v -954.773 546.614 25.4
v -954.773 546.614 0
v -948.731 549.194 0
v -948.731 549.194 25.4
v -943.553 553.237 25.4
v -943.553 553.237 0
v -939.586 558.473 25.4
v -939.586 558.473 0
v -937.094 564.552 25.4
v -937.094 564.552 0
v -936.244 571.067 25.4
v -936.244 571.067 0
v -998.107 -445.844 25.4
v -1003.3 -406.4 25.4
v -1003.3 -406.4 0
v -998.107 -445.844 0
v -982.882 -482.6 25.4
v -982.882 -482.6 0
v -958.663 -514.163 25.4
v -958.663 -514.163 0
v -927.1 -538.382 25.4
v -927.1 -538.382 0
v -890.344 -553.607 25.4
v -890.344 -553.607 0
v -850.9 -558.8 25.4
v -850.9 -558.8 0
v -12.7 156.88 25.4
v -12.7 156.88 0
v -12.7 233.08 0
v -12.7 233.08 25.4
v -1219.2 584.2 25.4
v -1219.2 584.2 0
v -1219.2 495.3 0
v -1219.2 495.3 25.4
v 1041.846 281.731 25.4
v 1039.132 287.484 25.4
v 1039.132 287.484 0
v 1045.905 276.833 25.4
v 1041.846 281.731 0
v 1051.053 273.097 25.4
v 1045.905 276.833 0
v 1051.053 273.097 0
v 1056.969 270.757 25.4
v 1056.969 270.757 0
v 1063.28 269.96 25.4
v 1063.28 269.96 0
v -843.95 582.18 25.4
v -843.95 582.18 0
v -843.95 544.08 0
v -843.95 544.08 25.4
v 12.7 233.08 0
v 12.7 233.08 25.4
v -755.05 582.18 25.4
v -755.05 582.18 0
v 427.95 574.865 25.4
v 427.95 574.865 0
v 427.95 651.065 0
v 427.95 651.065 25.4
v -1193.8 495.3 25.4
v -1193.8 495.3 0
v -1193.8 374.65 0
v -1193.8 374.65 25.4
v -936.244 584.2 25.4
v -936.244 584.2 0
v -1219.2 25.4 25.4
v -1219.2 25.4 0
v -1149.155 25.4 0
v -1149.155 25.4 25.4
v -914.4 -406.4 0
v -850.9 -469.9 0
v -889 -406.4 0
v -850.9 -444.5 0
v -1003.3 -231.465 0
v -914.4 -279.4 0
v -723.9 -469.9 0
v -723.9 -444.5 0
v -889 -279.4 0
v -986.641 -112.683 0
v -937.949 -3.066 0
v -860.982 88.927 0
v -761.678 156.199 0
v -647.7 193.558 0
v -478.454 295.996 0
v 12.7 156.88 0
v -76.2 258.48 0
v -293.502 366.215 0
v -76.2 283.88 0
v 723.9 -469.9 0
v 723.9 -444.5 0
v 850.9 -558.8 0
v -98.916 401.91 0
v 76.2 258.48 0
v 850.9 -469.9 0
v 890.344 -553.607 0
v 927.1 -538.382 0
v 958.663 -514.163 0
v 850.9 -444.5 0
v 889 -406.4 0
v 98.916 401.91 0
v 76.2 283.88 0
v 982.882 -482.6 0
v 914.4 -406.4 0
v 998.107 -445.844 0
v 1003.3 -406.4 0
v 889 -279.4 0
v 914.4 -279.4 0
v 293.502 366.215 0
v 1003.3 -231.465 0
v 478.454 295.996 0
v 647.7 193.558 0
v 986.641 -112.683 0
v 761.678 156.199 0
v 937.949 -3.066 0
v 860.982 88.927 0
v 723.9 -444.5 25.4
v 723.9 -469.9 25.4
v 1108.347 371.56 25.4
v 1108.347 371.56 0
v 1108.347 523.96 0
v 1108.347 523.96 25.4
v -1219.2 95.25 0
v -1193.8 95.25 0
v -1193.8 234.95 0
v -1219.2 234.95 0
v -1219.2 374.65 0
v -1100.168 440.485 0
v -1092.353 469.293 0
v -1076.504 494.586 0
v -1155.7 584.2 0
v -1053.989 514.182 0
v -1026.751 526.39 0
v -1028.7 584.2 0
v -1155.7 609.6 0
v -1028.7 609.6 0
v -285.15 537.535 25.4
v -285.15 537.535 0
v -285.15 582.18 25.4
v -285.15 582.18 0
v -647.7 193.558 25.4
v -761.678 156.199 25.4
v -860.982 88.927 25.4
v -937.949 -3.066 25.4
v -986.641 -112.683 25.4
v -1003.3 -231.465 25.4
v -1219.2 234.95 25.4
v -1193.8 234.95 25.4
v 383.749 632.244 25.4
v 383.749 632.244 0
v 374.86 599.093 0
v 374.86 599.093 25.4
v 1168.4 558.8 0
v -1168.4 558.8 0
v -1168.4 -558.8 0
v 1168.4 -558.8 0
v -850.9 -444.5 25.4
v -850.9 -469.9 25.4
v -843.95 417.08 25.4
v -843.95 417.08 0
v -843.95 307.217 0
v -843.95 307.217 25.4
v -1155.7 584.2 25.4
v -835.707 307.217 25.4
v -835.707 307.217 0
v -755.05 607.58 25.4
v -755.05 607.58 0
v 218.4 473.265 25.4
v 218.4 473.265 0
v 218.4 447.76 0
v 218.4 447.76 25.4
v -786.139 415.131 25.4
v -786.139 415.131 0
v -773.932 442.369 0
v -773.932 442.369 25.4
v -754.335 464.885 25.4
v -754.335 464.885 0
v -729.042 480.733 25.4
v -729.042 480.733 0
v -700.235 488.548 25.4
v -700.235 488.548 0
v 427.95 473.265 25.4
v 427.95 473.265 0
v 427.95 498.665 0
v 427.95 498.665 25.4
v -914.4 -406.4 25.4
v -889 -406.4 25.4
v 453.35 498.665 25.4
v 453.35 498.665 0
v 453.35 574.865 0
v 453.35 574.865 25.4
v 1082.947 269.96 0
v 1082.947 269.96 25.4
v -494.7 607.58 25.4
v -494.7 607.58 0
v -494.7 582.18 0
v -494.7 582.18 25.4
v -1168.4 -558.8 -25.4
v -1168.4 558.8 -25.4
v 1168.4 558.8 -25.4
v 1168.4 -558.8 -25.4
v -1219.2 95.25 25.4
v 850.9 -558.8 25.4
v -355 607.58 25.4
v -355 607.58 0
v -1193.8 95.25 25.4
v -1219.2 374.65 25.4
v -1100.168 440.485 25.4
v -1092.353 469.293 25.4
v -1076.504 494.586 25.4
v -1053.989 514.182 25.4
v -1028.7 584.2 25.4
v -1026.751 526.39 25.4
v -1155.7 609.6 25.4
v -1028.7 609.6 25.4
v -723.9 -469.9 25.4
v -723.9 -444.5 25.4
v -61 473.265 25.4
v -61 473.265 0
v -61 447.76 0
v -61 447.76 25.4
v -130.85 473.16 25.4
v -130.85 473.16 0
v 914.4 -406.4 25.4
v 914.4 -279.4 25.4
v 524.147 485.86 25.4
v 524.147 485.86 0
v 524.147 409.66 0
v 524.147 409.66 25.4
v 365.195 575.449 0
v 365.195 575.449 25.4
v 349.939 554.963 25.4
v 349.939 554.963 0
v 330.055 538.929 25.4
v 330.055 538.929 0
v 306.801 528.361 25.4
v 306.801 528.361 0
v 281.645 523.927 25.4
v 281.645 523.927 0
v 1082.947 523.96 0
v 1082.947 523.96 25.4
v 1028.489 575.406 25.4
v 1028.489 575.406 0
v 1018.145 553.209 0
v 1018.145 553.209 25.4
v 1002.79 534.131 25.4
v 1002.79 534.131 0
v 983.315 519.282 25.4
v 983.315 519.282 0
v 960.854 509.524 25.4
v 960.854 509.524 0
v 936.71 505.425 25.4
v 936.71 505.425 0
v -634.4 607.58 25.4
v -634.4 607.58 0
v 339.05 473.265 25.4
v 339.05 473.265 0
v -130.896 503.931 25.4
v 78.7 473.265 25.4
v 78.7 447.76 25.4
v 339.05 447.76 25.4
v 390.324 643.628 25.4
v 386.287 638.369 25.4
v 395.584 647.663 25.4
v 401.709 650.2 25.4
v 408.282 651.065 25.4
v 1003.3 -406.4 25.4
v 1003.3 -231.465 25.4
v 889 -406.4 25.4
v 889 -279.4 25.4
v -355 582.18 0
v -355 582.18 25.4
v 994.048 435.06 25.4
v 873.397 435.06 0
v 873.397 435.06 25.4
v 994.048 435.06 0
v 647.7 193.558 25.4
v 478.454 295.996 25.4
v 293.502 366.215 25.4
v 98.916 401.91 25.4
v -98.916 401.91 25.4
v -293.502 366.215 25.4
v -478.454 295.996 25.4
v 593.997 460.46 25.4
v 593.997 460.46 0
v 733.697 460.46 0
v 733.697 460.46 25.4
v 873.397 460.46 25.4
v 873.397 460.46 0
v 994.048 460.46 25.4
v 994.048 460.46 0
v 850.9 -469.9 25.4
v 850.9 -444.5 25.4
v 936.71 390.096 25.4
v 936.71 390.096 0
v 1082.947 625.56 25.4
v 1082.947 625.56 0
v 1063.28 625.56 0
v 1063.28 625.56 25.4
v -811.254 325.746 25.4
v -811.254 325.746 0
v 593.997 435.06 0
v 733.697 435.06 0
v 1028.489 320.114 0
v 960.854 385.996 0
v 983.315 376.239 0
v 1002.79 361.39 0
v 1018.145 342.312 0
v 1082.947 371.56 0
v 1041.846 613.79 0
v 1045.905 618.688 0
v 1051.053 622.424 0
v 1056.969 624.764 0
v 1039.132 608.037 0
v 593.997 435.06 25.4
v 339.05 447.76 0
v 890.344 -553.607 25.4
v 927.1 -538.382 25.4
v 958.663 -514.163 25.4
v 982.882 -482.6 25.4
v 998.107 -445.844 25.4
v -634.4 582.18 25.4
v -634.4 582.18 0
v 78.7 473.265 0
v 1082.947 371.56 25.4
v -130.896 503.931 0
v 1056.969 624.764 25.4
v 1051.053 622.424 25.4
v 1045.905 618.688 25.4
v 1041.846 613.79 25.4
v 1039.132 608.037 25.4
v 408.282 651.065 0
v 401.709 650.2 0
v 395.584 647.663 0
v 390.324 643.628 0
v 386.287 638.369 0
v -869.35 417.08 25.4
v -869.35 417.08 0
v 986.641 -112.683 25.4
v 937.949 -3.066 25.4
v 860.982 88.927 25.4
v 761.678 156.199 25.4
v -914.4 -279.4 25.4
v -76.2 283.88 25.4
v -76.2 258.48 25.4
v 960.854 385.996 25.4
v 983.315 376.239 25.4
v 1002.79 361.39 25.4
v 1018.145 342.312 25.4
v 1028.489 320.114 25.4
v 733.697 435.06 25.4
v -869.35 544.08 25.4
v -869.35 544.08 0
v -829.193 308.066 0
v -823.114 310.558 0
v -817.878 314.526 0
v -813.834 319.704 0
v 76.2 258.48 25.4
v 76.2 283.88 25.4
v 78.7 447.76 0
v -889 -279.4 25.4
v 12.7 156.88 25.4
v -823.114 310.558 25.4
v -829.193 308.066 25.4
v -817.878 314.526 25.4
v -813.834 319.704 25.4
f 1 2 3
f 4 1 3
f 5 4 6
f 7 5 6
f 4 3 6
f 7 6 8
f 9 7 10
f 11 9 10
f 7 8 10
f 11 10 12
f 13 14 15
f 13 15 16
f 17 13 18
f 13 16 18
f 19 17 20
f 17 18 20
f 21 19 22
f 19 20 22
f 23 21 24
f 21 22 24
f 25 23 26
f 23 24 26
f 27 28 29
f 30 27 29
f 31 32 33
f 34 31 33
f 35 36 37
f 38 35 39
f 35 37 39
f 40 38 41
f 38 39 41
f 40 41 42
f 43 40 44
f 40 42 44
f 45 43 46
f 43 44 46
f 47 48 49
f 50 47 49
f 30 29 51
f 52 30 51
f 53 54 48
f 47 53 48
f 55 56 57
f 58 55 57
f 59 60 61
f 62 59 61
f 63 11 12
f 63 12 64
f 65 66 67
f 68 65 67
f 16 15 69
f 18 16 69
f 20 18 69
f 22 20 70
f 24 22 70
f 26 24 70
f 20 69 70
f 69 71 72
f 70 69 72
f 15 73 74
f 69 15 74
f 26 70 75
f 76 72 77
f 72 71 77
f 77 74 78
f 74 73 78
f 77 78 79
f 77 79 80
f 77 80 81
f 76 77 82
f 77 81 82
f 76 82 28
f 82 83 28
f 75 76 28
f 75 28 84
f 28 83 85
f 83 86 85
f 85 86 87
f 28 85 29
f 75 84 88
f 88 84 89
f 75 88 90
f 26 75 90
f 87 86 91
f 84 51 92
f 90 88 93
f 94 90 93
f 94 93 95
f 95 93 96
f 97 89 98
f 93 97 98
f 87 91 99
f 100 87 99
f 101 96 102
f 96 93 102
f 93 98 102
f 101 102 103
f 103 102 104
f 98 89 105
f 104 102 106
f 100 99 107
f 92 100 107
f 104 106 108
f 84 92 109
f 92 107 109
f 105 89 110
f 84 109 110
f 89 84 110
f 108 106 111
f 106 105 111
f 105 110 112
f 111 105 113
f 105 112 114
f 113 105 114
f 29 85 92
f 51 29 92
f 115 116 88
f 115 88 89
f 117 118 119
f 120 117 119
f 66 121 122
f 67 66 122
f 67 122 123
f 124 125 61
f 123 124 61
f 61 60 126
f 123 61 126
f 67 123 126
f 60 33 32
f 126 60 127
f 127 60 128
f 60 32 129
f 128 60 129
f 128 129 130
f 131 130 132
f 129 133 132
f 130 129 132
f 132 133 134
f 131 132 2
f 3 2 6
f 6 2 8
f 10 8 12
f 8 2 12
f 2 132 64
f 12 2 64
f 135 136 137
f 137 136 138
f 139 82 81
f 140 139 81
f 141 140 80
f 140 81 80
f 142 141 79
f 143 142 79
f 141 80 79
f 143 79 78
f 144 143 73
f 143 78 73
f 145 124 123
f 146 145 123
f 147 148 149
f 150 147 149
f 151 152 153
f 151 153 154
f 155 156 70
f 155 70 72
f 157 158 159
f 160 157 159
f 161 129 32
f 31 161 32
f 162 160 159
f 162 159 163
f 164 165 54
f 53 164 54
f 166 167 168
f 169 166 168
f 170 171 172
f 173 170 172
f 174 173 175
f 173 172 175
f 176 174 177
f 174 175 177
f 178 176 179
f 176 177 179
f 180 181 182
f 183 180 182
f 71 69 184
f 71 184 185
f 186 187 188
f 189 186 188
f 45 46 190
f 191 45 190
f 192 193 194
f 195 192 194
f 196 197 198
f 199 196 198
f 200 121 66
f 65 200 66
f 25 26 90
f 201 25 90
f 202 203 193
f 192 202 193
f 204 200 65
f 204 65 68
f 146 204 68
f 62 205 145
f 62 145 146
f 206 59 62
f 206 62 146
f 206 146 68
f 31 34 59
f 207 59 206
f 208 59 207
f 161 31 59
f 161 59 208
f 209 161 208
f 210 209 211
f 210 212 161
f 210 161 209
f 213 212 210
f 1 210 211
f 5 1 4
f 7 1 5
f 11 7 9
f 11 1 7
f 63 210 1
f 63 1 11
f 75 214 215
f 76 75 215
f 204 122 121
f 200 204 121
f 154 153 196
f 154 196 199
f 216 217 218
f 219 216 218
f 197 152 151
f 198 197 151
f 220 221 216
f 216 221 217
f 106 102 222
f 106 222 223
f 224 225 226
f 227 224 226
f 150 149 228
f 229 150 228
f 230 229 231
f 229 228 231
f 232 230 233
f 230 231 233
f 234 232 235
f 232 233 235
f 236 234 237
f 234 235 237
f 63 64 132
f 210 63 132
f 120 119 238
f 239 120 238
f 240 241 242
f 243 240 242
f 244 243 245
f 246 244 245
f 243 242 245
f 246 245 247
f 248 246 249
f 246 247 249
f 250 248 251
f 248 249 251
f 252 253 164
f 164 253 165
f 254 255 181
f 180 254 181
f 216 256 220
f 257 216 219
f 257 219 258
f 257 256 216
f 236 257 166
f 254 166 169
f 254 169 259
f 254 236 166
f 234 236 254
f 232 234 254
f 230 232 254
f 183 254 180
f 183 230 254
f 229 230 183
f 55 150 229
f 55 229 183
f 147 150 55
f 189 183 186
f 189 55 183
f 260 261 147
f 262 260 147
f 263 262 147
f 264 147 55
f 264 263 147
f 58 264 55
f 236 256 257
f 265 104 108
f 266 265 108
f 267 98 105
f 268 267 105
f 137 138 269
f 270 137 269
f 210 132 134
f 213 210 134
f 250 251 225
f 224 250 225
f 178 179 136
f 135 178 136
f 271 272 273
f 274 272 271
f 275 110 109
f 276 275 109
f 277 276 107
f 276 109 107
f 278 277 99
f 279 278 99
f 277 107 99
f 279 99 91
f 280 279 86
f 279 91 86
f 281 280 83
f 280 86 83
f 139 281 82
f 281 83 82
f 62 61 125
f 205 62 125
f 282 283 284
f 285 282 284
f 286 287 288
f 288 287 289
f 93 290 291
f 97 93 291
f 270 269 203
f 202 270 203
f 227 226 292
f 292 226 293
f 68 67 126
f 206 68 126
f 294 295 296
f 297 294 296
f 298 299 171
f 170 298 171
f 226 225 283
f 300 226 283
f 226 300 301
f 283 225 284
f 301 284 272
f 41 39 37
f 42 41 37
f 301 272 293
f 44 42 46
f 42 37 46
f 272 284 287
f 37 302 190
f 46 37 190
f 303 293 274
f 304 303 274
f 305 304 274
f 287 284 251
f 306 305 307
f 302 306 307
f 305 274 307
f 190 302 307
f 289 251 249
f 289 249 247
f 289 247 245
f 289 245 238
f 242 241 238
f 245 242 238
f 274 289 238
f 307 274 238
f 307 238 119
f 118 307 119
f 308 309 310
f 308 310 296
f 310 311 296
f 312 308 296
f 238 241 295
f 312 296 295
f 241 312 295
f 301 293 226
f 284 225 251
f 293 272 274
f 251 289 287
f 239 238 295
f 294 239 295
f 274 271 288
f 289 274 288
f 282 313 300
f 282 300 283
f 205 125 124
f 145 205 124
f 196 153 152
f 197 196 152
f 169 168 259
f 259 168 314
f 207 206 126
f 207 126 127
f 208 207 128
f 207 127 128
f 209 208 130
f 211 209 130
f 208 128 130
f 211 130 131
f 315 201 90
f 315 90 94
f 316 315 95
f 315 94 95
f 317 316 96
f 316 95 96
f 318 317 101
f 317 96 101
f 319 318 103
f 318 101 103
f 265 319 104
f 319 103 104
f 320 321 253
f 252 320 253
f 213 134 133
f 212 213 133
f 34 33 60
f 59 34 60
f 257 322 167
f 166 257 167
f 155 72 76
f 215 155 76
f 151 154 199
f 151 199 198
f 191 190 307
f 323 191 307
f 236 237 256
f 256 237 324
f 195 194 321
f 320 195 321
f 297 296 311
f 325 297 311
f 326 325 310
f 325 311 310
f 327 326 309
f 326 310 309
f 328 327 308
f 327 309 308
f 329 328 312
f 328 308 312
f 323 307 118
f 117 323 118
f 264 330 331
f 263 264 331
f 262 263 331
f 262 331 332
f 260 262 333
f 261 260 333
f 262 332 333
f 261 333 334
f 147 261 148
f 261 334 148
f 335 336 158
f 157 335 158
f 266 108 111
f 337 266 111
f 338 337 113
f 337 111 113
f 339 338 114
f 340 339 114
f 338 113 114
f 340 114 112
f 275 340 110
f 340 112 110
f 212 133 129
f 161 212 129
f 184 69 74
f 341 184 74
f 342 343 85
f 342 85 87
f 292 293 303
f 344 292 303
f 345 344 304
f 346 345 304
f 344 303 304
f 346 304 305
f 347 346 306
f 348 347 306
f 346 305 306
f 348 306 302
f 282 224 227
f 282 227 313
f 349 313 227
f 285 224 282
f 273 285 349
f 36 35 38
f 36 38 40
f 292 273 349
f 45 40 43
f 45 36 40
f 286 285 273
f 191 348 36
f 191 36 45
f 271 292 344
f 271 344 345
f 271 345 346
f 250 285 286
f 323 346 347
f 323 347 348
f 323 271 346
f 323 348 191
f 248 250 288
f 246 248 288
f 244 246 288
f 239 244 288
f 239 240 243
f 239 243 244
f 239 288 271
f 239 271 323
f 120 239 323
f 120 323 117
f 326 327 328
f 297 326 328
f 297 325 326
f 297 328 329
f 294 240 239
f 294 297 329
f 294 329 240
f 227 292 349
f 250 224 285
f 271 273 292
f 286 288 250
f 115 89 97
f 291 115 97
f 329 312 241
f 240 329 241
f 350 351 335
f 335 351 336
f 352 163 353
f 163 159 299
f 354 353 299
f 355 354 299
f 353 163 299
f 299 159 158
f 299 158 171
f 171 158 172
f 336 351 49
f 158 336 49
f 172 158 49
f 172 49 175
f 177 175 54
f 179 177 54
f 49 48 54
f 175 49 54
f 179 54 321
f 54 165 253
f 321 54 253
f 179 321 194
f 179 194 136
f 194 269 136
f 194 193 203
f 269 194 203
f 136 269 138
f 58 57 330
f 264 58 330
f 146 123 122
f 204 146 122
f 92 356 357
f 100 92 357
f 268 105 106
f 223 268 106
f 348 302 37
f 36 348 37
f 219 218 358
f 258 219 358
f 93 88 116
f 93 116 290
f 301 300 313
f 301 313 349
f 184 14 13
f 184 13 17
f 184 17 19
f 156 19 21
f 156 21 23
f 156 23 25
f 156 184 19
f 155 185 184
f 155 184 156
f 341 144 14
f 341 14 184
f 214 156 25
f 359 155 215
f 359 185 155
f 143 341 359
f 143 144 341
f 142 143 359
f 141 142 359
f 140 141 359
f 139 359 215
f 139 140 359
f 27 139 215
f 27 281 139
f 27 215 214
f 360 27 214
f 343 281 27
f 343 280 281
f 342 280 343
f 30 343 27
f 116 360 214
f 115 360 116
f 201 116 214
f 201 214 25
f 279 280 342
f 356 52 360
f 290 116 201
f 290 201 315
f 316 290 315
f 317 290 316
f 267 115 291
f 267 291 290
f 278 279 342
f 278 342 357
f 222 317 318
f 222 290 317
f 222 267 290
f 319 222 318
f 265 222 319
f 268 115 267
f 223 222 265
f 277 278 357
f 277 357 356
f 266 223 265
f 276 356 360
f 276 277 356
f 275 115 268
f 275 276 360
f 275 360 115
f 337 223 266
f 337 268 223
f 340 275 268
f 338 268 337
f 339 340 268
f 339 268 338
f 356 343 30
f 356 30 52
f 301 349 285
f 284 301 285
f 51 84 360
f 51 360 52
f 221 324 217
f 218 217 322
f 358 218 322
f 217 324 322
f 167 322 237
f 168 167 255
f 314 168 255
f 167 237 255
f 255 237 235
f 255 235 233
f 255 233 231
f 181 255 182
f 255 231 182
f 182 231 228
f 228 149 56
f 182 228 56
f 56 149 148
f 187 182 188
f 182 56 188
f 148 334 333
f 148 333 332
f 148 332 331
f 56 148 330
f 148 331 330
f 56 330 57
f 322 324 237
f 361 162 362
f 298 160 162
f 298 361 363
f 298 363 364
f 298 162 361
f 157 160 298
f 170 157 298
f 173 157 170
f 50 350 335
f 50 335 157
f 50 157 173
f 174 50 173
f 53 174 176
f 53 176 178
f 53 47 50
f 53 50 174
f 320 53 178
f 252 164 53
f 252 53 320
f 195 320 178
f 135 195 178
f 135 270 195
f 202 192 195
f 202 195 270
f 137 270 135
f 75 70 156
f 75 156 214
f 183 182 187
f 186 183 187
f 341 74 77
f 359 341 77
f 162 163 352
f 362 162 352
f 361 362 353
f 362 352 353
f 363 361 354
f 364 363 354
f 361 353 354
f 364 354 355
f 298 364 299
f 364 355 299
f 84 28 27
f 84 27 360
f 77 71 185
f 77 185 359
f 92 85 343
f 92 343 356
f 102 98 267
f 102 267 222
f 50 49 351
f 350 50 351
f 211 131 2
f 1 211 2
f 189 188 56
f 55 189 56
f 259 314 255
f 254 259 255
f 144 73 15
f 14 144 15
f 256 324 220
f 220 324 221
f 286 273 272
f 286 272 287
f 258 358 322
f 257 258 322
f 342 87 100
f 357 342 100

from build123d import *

# Parameters (mm, degrees)
F1_W     = 127
F1_H     = 25.4
F1_W_2   = 25.4
F1_H_2   = 127
F1_H_3   = 76.2
F1_W_3   = 152.4
F2_DEPTH = 25.4
F1_W_4   = 139.7
F1_W_5   = 120.6500786332
F3_W     = 2336.8
F3_H     = 1117.6
F4_DEPTH = 25.4


# Not quite as in the source:
# - a variable given as a bare number and used for a length is read in inches; the dataset says mm whatever the document's units were


with BuildPart() as f2:
    # F1 (on Top) → F2 (new body)
    with BuildSketch(Plane.XY):
        with BuildLine():
            ThreePointArc((647.7, 193.5579180717), (0, 406.4), (-647.7, 193.5579180717))
            ThreePointArc((-647.7, 193.5579180717), (-902.6754821843, 45.6159123042), (-1003.3, -231.4653754076))
            Line((-1003.3, -231.4653754076), (-1003.3, -406.4))
            ThreePointArc((-1003.3, -406.4), (-958.6630734528, -514.1630734528), (-850.9, -558.8))
            Line((-850.9, -558.8), (850.9, -558.8))
            ThreePointArc((850.9, -558.8), (958.6630734528, -514.1630734528), (1003.3, -406.4))
            Line((1003.3, -406.4), (1003.3, -231.4653754076))
            ThreePointArc((1003.3, -231.4653754076), (902.6754821843, 45.6159123042), (647.7, 193.5579180717))
        make_face()
        with Locations((-787.4, -457.2)):
            Rectangle(F1_W, F1_H, mode=Mode.SUBTRACT)
        with Locations((-901.7, -342.9)):
            Rectangle(F1_W_2, F1_H_2, mode=Mode.SUBTRACT)
        with Locations((787.4, -457.2)):
            Rectangle(F1_W, F1_H, mode=Mode.SUBTRACT)
        with Locations((901.7, -342.9)):
            Rectangle(F1_W_2, F1_H_2, mode=Mode.SUBTRACT)
        with Locations((0, 194.9797632933)):
            Rectangle(F1_W_2, F1_H_3, mode=Mode.SUBTRACT)
        with Locations((0, 271.1797632933)):
            Rectangle(F1_W_3, F1_H, mode=Mode.SUBTRACT)
    extrude(amount=F2_DEPTH)


with BuildPart() as f2b:
    # F1 (on Top) → F2, piece 2 (new body)
    with BuildSketch(Plane.XY):
        with BuildLine():
            Line((-1155.7, 584.2), (-1219.2, 584.2))
            Line((-1219.2, 584.2), (-1219.2, 495.3))
            Line((-1219.2, 495.3), (-1193.8, 495.3))
            Line((-1193.8, 495.3), (-1193.8, 374.65))
            Line((-1193.8, 374.65), (-1219.2, 374.65))
            Line((-1219.2, 374.65), (-1219.2, 234.95))
            Line((-1219.2, 234.95), (-1193.8, 234.95))
            Line((-1193.8, 234.95), (-1193.8, 95.25))
            Line((-1193.8, 95.25), (-1219.2, 95.25))
            Line((-1219.2, 95.25), (-1219.2, 25.4))
            Line((-1219.2, 25.4), (-1149.1548928144, 25.4))
            Line((-1149.1548928144, 25.4), (-1100.1678840305, 440.4851537224))
            ThreePointArc((-1100.1678840305, 440.4851537224), (-1076.504269872, 494.5859013387), (-1026.751056115, 526.3896))
            Line((-1026.751056115, 526.3896), (-954.7732654951, 546.6136509902))
            ThreePointArc((-954.7732654951, 546.6136509902), (-941.3995358626, 555.7265307509), (-936.244, 571.0667286567))
            Line((-936.244, 571.0667286567), (-936.244, 584.2))
            Line((-936.244, 584.2), (-1028.7, 584.2))
            Line((-1028.7, 584.2), (-1028.7, 609.6))
            Line((-1028.7, 609.6), (-1155.7, 609.6))
            Line((-1155.7, 609.6), (-1155.7, 584.2))
        make_face()
    extrude(amount=F2_DEPTH)


with BuildPart() as f2c:
    # F1 (on Top) → F2, piece 3 (new body)
    with BuildSketch(Plane.XY):
        with BuildLine():
            Line((-843.9495392799, 307.2166677045), (-835.7073963069, 307.2166677045))
            ThreePointArc((-835.7073963069, 307.2166677045), (-820.3671984011, 312.3722035671), (-811.2543186404, 325.7459331997))
            Line((-811.2543186404, 325.7459331997), (-786.1391392799, 415.1313447704))
            ThreePointArc((-786.1391392799, 415.1313447704), (-754.3354406186, 464.8845585274), (-700.2346930023, 488.5481726859))
            Line((-700.2346930023, 488.5481726859), (-285.1495392799, 537.5351814698))
            Line((-285.1495392799, 537.5351814698), (-285.1495392799, 582.1802886554))
            Line((-285.1495392799, 582.1802886554), (-354.9995392799, 582.1802886554))
            Line((-354.9995392799, 582.1802886554), (-354.9995392799, 607.5802886554))
            Line((-354.9995392799, 607.5802886554), (-494.6995392799, 607.5802886554))
            Line((-494.6995392799, 607.5802886554), (-494.6995392799, 582.1802886554))
            Line((-494.6995392799, 582.1802886554), (-634.3995392799, 582.1802886554))
            Line((-634.3995392799, 582.1802886554), (-634.3995392799, 607.5802886554))
            Line((-634.3995392799, 607.5802886554), (-755.0495392799, 607.5802886554))
            Line((-755.0495392799, 607.5802886554), (-755.0495392799, 582.1802886554))
            Line((-755.0495392799, 582.1802886554), (-843.9495392799, 582.1802886554))
            Line((-843.9495392799, 582.1802886554), (-843.9495392799, 544.0802886554))
            Line((-843.9495392799, 544.0802886554), (-869.3495392799, 544.0802886554))
            Line((-869.3495392799, 544.0802886554), (-869.3495392799, 417.0802886554))
            Line((-869.3495392799, 417.0802886554), (-843.9495392799, 417.0802886554))
            Line((-843.9495392799, 417.0802886554), (-843.9495392799, 307.2166677045))
        make_face()
    extrude(amount=F2_DEPTH)


with BuildPart() as f2d:
    # F1 (on Top) → F2, piece 4 (new body)
    with BuildSketch(Plane.XY):
        with BuildLine():
            Line((524.1474925995, 485.8604307627), (524.1474925995, 447.7604307627))
            Line((524.1474925995, 447.7604307627), (524.1474925995, 409.6604307627))
            Line((524.1474925995, 409.6604307627), (936.7098303317, 390.0960868362))
            ThreePointArc((936.7098303317, 390.0960868362), (993.5014833177, 369.4029146453), (1028.4893234405, 320.1144751514))
            Line((1028.4893234405, 320.1144751514), (1039.1319184416, 287.4843454036))
            ThreePointArc((1039.1319184416, 287.4843454036), (1048.3617125766, 274.8030407518), (1063.2799469204, 269.9604307627))
            Line((1063.2799469204, 269.9604307627), (1082.9474925995, 269.9604307627))
            Line((1082.9474925995, 269.9604307627), (1082.9474925995, 371.5604307627))
            Line((1082.9474925995, 371.5604307627), (1108.3474925995, 371.5604307627))
            Line((1108.3474925995, 371.5604307627), (1108.3474925995, 447.7604307627))
            Line((1108.3474925995, 447.7604307627), (1108.3474925995, 523.9604307627))
            Line((1108.3474925995, 523.9604307627), (1082.9474925995, 523.9604307627))
            Line((1082.9474925995, 523.9604307627), (1082.9474925995, 625.5604307627))
            Line((1082.9474925995, 625.5604307627), (1063.2799469204, 625.5604307627))
            ThreePointArc((1063.2799469204, 625.5604307627), (1048.3617125766, 620.7178207737), (1039.1319184416, 608.0365161219))
            Line((1039.1319184416, 608.0365161219), (1028.4893234405, 575.4063863741))
            ThreePointArc((1028.4893234405, 575.4063863741), (993.5014833177, 526.1179468802), (936.7098303317, 505.4247746893))
            Line((936.7098303317, 505.4247746893), (524.1474925995, 485.8604307627))
        make_face()
        with Locations((663.8474925995, 447.7604307627)):
            Rectangle(F1_W_4, F1_H, mode=Mode.SUBTRACT)
        with Locations((933.7225319161, 447.7604307627)):
            Rectangle(F1_W_5, F1_H, mode=Mode.SUBTRACT)
    extrude(amount=F2_DEPTH)


with BuildPart() as f2e:
    # F1 (on Top) → F2, piece 5 (new body)
    with BuildSketch(Plane.XY):
        with BuildLine():
            ThreePointArc((374.8597252388, 599.0932477678), (340.5029078126, 546.3184624133), (281.6454797612, 523.9271239977))
            Line((281.6454797612, 523.9271239977), (-130.8961626275, 503.931140311))
            Line((-130.8961626275, 503.931140311), (-130.8499912567, 473.1604307627))
            Line((-130.8499912567, 473.1604307628), (-61.0000698899, 473.2652403909))
            Line((-61.0000698899, 473.2652403909), (-61.0000698899, 447.7604307627))
            Line((-61.0000698899, 447.7604307627), (78.6999301101, 447.7604307627))
            Line((78.6999301101, 447.7604307627), (78.6999301101, 473.2652403909))
            Line((78.6999301101, 473.2652403909), (218.3999301101, 473.2652403909))
            Line((218.3999301101, 473.2652403909), (218.3999301101, 447.7604307627))
            Line((218.3999301101, 447.7604307627), (339.0500087433, 447.7604307627))
            Line((339.0500087433, 447.7604307627), (339.0500087433, 473.2652403909))
            Line((339.0500087433, 473.2652403909), (427.9500087433, 473.2652403909))
            Line((427.9500087433, 473.2652403909), (427.9500087433, 498.6652403909))
            Line((427.9500087433, 498.6652403909), (453.3500087433, 498.6652403909))
            Line((453.3500087433, 498.6652403909), (453.3500087433, 574.8652403909))
            Line((453.3500087433, 574.8652403909), (427.9500087433, 574.8652403909))
            Line((427.9500087433, 574.8652403909), (427.9500087433, 651.0652403909))
            Line((427.9500087433, 651.0652403909), (408.2824630643, 651.0652403909))
            ThreePointArc((408.2824630643, 651.0652403909), (392.821845185, 645.8178902115), (383.7492017941, 632.2439250201))
            Line((383.7492017941, 632.2439250201), (374.8597252388, 599.0932477678))
        make_face()
    extrude(amount=F2_DEPTH)


with BuildPart() as f4:
    # F3 (on face) → F4 (new body)
    with BuildSketch(Plane.XY):
        Rectangle(F3_W, F3_H)
    extrude(amount=-F4_DEPTH)


solid = Compound([f2.part, f2b.part, f2c.part, f2d.part, f2e.part, f4.part])
